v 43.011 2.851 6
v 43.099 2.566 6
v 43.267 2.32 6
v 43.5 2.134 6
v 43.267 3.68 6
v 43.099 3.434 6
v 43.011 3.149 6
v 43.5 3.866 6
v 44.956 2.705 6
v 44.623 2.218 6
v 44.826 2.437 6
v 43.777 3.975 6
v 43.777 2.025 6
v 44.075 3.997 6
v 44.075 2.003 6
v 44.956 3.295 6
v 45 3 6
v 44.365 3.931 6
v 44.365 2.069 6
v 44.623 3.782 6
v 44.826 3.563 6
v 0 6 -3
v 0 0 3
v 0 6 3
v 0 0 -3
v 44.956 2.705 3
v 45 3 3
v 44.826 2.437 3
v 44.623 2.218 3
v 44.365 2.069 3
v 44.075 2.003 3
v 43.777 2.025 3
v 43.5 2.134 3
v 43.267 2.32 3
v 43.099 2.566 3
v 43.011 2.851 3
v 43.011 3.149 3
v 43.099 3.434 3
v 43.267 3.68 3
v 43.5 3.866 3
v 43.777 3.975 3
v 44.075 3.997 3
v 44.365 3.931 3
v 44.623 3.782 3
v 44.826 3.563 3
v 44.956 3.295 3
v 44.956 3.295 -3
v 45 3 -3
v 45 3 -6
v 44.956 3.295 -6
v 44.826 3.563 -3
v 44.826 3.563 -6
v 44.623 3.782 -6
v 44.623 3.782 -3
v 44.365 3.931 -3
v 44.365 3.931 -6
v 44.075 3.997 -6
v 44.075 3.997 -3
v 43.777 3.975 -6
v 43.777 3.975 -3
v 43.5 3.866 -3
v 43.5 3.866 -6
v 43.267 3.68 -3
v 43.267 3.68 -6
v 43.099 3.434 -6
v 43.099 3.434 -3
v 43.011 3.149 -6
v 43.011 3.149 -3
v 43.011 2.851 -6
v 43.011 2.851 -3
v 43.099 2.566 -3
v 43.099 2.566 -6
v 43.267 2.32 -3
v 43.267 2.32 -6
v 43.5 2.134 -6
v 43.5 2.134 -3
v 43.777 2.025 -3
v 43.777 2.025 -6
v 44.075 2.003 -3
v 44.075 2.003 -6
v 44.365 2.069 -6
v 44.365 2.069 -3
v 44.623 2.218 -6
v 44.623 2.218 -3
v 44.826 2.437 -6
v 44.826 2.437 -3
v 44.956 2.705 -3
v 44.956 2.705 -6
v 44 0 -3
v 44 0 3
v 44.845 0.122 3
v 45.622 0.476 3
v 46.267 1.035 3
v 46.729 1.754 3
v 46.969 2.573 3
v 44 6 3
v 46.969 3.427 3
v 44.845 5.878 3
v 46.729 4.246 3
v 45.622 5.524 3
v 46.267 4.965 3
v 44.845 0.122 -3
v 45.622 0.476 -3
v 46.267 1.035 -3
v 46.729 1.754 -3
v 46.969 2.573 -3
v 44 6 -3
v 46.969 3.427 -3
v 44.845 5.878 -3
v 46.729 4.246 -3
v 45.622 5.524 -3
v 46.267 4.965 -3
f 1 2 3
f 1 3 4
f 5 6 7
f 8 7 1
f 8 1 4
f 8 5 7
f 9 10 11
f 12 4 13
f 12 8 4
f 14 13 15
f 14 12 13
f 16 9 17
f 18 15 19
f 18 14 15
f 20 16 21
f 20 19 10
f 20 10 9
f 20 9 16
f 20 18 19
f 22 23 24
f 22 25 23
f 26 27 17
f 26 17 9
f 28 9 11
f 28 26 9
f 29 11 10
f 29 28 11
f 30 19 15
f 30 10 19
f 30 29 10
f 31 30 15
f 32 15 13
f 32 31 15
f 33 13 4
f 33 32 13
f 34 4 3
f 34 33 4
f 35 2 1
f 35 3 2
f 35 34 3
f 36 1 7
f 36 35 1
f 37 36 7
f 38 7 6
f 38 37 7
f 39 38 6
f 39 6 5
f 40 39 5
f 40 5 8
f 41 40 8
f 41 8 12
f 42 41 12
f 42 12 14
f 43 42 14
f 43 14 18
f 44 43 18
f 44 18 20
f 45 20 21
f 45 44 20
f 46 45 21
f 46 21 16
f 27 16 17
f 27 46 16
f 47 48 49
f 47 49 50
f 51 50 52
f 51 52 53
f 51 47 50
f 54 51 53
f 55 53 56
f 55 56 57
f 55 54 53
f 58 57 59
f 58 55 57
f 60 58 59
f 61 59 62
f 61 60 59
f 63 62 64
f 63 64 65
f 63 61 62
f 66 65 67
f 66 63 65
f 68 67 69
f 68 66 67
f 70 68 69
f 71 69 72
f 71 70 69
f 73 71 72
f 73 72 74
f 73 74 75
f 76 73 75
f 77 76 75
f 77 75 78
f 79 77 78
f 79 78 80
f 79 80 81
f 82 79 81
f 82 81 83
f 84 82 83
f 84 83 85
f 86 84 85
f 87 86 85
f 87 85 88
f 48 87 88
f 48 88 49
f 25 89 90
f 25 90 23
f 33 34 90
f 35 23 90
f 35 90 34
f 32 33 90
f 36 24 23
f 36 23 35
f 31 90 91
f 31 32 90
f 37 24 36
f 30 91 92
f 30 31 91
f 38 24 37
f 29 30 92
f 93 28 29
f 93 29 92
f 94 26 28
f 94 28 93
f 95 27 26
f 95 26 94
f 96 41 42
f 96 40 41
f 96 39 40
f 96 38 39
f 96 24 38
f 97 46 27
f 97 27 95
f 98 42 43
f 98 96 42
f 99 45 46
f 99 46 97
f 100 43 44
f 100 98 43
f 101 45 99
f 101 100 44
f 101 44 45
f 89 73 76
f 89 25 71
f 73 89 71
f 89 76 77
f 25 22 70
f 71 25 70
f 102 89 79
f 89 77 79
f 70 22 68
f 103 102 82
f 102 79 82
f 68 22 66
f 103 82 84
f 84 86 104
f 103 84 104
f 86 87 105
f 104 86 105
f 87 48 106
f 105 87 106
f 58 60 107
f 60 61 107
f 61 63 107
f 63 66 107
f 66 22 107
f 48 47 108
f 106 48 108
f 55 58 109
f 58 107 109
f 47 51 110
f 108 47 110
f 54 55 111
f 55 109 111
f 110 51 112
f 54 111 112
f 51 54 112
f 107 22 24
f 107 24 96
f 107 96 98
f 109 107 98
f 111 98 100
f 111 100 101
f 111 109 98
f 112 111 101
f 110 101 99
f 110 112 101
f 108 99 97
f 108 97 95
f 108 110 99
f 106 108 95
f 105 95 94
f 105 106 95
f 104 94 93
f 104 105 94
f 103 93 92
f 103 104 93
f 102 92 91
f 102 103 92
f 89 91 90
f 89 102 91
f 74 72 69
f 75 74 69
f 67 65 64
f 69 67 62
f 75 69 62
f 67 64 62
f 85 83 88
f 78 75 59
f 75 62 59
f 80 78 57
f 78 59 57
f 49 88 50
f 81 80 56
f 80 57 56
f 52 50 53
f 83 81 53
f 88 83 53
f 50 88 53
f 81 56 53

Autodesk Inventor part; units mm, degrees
ref_plane "YZ Plane" through (0, 0, 0) normal (1, 0, 0) x (0, 1, 0)
ref_plane "XZ Plane" through (0, 0, 0) normal (0, 1, 0) x (-1, 0, 0)
ref_plane "XY Plane" through (0, 0, 0) normal (0, 0, 1) x (1, 0, 0)
sketch "Sketch1" plane through (0, 0, 0) normal (0, 0, 1) x (1, 0, 0)
  line L0 (0, 6) -> (47, 6)
  line L1 (56, 0) -> (0, 0)
  line L2 (47, 0) -> (47, 6)
  circle A0 centre (44, 3) radius 1
  line L3 (0, 0) -> (0, 6)
  arc A1 (44, 0) -> (44, 6) centre (44, 3) ccw
  dimension "d26" = 2
  dimension "d29" = 47
  dimension "d30" = 3
  dimension "d31" = 3
  dimension "d32" = 6
extrude "Extrusion1" add sketch "Sketch1" along normal mid plane 6 contours L0 A1 L1 L3 | A0
sketch "Sketch6" plane through (0, 0, 3) normal (0, 0, 1) x (1, 0, 0)
  line L0 (0, 6) -> (47, 6)
  line L1 (47, 0) -> (47, 6)
  circle A0 centre (44, 3) radius 1
  line L2 (0, 0) -> (0, 6)
  arc A1 (44, 0) -> (44, 6) centre (44, 3) ccw projected
  line L3 (0, 0) -> (44, 0) projected
  line L4 (44, 6) -> (0, 6) projected
  dimension "d34" = 2
  dimension "d36" = 3
  dimension "d37" = 3
extrude "Extrusion4" add sketch "Sketch6" along normal blind 3 and the other way blind 9 contours A0
properties part number "Arm"
